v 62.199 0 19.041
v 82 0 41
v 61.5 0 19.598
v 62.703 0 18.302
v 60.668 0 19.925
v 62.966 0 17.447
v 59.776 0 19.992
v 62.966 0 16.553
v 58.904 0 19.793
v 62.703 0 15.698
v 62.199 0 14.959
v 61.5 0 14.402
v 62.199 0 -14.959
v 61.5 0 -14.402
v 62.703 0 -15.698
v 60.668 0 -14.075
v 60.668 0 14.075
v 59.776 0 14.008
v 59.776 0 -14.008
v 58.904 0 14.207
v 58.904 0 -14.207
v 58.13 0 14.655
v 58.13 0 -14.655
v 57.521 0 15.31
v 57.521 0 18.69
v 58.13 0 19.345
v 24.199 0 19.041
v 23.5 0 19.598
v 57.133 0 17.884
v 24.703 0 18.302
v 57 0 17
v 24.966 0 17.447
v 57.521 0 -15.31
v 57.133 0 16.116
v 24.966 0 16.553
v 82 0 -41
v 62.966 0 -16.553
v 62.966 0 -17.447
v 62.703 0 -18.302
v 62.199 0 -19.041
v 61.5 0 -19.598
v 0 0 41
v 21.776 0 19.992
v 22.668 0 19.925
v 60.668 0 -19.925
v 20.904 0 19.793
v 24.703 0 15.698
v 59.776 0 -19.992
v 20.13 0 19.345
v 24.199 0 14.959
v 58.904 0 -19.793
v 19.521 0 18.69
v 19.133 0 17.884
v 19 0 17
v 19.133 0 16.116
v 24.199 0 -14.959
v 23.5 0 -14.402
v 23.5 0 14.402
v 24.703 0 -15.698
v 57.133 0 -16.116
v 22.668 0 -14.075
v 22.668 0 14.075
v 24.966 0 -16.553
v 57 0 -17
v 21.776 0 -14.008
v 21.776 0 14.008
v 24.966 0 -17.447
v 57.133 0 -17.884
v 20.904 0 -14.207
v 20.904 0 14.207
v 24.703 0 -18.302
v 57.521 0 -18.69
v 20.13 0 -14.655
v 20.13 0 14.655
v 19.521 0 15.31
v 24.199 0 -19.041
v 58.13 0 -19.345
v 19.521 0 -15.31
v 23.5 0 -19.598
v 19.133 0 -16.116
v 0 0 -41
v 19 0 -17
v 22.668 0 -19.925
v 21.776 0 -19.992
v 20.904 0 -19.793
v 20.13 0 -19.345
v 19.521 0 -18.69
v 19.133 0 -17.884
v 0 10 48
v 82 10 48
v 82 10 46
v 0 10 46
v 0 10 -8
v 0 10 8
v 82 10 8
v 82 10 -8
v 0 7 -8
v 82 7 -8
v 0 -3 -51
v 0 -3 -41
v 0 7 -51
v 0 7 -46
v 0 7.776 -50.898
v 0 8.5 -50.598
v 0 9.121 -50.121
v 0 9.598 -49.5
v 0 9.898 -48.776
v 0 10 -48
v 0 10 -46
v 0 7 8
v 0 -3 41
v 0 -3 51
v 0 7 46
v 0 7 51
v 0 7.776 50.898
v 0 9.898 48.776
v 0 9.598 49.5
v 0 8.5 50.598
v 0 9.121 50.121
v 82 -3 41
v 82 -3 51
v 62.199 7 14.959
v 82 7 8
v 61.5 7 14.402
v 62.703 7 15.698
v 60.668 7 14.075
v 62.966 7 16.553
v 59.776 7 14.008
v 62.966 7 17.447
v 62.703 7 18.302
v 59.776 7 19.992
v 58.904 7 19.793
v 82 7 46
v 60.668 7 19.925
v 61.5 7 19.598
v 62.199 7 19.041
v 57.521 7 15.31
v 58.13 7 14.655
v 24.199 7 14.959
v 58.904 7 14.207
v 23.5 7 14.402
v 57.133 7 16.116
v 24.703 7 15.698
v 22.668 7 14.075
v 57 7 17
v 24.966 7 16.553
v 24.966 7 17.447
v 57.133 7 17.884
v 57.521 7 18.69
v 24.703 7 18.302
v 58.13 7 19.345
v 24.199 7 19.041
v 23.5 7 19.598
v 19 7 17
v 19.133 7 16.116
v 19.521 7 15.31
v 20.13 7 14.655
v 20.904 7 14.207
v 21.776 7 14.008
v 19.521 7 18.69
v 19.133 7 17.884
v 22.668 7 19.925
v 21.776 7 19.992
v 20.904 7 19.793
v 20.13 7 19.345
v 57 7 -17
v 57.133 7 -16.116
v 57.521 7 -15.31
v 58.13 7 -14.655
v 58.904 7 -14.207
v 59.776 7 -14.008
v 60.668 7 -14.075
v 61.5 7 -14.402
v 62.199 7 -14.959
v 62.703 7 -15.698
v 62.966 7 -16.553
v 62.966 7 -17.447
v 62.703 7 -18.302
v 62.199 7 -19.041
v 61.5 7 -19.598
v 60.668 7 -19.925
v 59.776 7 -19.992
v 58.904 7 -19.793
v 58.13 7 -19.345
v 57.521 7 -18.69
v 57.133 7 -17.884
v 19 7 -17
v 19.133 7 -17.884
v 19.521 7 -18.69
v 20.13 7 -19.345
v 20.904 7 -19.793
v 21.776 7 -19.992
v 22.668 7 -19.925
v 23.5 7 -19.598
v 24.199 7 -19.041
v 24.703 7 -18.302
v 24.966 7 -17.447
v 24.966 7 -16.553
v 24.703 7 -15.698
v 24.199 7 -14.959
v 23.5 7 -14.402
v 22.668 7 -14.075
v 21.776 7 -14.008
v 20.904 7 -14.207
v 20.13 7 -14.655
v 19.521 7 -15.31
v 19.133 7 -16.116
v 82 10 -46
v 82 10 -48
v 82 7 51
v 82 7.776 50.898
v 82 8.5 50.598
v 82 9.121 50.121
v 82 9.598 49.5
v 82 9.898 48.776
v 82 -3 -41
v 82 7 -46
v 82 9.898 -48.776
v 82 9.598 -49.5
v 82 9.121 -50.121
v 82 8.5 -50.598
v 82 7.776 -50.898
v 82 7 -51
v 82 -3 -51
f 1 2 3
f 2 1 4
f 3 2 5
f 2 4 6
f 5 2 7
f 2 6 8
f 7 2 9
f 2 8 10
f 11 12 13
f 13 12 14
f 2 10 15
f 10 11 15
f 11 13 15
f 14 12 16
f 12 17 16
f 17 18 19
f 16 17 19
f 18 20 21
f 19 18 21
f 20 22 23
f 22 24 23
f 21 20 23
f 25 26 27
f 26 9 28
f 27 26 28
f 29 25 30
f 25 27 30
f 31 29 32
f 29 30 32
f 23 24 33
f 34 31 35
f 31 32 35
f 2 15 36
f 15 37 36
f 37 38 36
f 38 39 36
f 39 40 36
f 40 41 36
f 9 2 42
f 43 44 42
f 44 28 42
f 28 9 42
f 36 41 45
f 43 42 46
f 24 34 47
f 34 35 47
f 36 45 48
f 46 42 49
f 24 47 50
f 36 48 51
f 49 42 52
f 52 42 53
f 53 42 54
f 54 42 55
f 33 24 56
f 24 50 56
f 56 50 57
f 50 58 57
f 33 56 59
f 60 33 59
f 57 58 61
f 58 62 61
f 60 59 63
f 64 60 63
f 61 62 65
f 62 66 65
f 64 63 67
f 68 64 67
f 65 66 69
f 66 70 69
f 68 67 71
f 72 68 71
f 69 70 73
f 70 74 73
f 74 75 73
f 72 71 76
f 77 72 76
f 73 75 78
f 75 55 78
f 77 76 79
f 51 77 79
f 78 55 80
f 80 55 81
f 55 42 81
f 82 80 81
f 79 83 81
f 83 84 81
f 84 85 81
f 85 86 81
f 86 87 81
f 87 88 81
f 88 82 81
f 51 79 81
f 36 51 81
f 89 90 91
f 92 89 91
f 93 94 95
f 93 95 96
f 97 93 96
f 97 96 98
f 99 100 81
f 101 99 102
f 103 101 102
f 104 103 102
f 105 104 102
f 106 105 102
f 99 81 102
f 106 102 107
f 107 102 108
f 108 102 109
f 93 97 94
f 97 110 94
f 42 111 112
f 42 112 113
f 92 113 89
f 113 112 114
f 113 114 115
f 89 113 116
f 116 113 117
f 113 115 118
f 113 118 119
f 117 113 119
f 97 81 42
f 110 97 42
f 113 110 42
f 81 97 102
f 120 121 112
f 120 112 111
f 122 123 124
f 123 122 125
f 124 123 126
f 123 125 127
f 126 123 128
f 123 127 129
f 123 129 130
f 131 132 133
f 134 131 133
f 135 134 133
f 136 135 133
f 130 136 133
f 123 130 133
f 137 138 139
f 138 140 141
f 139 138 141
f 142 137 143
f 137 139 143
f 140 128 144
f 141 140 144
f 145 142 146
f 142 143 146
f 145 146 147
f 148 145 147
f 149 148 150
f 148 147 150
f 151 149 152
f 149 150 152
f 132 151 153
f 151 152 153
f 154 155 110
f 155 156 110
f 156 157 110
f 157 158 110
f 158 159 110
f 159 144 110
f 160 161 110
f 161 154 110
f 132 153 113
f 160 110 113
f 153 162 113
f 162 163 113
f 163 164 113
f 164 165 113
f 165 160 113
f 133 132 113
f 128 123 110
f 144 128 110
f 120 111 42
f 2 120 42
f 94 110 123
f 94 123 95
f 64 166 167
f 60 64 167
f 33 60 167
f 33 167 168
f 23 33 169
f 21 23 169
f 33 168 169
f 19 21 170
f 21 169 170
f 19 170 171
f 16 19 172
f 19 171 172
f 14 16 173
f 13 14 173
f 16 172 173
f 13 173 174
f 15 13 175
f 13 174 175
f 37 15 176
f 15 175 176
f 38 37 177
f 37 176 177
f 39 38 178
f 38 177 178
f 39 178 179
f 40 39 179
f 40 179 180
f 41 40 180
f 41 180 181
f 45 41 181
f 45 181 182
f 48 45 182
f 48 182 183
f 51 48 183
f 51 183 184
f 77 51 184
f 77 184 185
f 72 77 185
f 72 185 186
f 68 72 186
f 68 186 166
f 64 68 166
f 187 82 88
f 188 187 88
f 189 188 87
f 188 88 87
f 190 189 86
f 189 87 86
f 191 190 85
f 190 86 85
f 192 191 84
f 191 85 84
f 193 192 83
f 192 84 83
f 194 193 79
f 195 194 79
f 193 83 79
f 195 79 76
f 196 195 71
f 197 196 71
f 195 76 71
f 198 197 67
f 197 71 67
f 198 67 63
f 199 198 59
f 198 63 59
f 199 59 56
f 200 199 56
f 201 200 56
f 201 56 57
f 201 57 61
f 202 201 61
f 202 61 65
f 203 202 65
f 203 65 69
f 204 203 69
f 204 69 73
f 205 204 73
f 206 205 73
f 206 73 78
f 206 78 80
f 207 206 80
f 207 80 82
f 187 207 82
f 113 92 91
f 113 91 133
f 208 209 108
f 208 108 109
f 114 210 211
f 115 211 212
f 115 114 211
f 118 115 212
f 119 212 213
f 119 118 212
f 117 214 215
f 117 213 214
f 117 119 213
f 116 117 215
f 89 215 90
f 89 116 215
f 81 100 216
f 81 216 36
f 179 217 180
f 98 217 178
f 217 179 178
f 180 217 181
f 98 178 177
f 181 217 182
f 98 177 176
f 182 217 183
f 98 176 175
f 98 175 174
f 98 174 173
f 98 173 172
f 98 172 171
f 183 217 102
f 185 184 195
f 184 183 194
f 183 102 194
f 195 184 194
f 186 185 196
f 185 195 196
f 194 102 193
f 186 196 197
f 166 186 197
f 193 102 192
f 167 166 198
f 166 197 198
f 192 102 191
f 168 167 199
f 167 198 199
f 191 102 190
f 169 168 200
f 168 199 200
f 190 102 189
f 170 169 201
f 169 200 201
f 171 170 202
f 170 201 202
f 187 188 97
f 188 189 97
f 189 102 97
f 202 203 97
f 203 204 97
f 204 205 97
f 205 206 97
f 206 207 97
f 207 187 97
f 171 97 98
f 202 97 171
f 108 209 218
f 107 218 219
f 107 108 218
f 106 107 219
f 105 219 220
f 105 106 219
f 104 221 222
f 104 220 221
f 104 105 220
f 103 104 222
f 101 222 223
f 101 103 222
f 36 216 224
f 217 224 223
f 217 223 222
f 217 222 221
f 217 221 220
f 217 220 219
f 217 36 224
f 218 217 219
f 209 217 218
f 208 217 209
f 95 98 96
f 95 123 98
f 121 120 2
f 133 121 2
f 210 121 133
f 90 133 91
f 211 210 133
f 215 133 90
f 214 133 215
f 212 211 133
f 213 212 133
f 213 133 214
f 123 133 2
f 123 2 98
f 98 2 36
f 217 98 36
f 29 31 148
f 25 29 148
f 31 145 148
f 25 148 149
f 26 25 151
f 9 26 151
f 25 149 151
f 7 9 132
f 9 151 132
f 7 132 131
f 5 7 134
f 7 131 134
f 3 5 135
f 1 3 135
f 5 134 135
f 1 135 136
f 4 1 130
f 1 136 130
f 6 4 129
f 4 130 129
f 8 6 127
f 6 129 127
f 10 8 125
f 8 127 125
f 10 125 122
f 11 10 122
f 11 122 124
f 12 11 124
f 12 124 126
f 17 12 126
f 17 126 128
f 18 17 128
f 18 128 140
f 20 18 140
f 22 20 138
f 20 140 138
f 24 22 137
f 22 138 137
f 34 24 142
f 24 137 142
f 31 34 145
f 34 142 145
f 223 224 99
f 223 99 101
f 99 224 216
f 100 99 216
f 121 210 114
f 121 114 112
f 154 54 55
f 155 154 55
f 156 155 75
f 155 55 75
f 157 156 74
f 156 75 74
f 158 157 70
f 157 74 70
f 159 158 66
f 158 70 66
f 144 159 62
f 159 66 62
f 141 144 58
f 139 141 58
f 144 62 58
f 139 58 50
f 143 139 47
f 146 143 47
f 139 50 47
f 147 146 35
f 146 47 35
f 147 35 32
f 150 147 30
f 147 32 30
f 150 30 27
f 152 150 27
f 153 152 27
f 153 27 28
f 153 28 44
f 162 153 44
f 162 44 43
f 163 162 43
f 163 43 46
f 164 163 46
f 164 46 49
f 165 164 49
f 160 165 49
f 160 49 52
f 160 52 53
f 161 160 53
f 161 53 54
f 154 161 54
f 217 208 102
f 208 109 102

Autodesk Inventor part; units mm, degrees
ref_plane "YZ Plane" through (0, 0, 0) normal (1, 0, 0) x (0, 1, 0)
ref_plane "XZ Plane" through (0, 0, 0) normal (0, 1, 0) x (-1, 0, 0)
ref_plane "XY Plane" through (0, 0, 0) normal (0, 0, 1) x (1, 0, 0)
sketch "Sketch1" plane through (0, 0, 0) normal (1, 0, 0) x (0, 1, 0)
  line L0 (7, 51) -> (0, 51)
  line L1 (0, 41) -> (0, -41)
  line L2 (0, -51) -> (7, -51)
  line L3 (7, 51) -> (-3, 51)
  line L4 (-3, 51) -> (-3, 41)
  line L5 (-3, 41) -> (0, 41)
  line L6 (7, 41) -> (7, 51)
  line L7 (7, 51) -> (7, 51)
  line L8 (10, 48) -> (10, 46)
  line L9 (10, 46) -> (7, 46)
  line L10 (7, 46) -> (7, 51)
  line L11 (7, 8) -> (10, 8)
  line L12 (10, 8) -> (10, -8)
  line L13 (10, -8) -> (7, -8)
  line L14 (-3, -41) -> (0, -41)
  line L15 (10, -46) -> (7, -46)
  line L16 (7, -51) -> (-3, -51)
  line L17 (-3, -51) -> (-3, -41)
  line L18 (7, -51) -> (0, -51)
  line L19 (7, -41) -> (7, -46)
  line L20 (7, -51) -> (7, -51)
  line L21 (10, -48) -> (10, -46)
  line L22 (7, -46) -> (7, -8)
  line L23 (7, 8) -> (7, 51)
  arc A0 (10, 48) -> (7, 51) centre (7, 48) ccw
  arc A1 (7, -51) -> (10, -48) centre (7, -48) ccw
  point P0 (0, 0)
  point P1 (10, -51)
  point P2 (0, 51)
  dimension "d10" = 10
  dimension "d11" = 10
  dimension "d13" = 5
  dimension "d15" = 43
  dimension "d16" = 59
  dimension "d17" = 102
  dimension "d18" = 13
  dimension "d19" = 3
  dimension "d20" = 3
extrude "Extrusion1" add sketch "Sketch1" along normal blind 82
sketch "Sketch2" plane through (0, 0, 0) normal (0, 1, 0) x (-1, 0, 0)
  line L0 (0, 51) -> (0, 48) projected
  line L1 (0, 51) -> (0, 17)
  line L2 (0, 41) -> (0, -41) projected
  line L3 (0, 17) -> (-22, 17)
  circle A0 centre (-22, 17) radius 3
  line L4 (0, -41) -> (0, -51) projected
  line L5 (0, -51) -> (0, -17)
  line L6 (0, -17) -> (-22, -17)
  line L7 (0, -41) -> (-82, -41) projected
  line L8 (0, -51) -> (-82, -51) projected
  line L9 (-82, -51) -> (-82, -17)
  line L10 (-82, 41) -> (-82, -41) projected
  line L11 (-82, -17) -> (-60, -17)
  line L12 (-82, 51) -> (-82, 48) projected
  line L13 (-82, 51) -> (-82, 17)
  line L14 (-82, 8) -> (-82, 46) projected
  line L15 (-82, 17) -> (-60, 17)
  circle A1 centre (-22, -17) radius 3
  circle A2 centre (-60, -17) radius 3
  circle A3 centre (-60, 17) radius 3
  point P0 (0, 0)
  dimension "d23" = 34
  dimension "d24" = 22
  dimension "d25" = 6
  dimension "d26" = 34
  dimension "d27" = 22
  dimension "d28" = 34
  dimension "d29" = 22
  dimension "d30" = 34
  dimension "d31" = 22
  dimension "d32" = 6
  dimension "d33" = 6
  dimension "d34" = 6
extrude "Extrusion2" cut sketch "Sketch2" along normal mid plane 62 contours A3 | A2 | A1 | A0
properties material "Polycarbonate, Clear"
